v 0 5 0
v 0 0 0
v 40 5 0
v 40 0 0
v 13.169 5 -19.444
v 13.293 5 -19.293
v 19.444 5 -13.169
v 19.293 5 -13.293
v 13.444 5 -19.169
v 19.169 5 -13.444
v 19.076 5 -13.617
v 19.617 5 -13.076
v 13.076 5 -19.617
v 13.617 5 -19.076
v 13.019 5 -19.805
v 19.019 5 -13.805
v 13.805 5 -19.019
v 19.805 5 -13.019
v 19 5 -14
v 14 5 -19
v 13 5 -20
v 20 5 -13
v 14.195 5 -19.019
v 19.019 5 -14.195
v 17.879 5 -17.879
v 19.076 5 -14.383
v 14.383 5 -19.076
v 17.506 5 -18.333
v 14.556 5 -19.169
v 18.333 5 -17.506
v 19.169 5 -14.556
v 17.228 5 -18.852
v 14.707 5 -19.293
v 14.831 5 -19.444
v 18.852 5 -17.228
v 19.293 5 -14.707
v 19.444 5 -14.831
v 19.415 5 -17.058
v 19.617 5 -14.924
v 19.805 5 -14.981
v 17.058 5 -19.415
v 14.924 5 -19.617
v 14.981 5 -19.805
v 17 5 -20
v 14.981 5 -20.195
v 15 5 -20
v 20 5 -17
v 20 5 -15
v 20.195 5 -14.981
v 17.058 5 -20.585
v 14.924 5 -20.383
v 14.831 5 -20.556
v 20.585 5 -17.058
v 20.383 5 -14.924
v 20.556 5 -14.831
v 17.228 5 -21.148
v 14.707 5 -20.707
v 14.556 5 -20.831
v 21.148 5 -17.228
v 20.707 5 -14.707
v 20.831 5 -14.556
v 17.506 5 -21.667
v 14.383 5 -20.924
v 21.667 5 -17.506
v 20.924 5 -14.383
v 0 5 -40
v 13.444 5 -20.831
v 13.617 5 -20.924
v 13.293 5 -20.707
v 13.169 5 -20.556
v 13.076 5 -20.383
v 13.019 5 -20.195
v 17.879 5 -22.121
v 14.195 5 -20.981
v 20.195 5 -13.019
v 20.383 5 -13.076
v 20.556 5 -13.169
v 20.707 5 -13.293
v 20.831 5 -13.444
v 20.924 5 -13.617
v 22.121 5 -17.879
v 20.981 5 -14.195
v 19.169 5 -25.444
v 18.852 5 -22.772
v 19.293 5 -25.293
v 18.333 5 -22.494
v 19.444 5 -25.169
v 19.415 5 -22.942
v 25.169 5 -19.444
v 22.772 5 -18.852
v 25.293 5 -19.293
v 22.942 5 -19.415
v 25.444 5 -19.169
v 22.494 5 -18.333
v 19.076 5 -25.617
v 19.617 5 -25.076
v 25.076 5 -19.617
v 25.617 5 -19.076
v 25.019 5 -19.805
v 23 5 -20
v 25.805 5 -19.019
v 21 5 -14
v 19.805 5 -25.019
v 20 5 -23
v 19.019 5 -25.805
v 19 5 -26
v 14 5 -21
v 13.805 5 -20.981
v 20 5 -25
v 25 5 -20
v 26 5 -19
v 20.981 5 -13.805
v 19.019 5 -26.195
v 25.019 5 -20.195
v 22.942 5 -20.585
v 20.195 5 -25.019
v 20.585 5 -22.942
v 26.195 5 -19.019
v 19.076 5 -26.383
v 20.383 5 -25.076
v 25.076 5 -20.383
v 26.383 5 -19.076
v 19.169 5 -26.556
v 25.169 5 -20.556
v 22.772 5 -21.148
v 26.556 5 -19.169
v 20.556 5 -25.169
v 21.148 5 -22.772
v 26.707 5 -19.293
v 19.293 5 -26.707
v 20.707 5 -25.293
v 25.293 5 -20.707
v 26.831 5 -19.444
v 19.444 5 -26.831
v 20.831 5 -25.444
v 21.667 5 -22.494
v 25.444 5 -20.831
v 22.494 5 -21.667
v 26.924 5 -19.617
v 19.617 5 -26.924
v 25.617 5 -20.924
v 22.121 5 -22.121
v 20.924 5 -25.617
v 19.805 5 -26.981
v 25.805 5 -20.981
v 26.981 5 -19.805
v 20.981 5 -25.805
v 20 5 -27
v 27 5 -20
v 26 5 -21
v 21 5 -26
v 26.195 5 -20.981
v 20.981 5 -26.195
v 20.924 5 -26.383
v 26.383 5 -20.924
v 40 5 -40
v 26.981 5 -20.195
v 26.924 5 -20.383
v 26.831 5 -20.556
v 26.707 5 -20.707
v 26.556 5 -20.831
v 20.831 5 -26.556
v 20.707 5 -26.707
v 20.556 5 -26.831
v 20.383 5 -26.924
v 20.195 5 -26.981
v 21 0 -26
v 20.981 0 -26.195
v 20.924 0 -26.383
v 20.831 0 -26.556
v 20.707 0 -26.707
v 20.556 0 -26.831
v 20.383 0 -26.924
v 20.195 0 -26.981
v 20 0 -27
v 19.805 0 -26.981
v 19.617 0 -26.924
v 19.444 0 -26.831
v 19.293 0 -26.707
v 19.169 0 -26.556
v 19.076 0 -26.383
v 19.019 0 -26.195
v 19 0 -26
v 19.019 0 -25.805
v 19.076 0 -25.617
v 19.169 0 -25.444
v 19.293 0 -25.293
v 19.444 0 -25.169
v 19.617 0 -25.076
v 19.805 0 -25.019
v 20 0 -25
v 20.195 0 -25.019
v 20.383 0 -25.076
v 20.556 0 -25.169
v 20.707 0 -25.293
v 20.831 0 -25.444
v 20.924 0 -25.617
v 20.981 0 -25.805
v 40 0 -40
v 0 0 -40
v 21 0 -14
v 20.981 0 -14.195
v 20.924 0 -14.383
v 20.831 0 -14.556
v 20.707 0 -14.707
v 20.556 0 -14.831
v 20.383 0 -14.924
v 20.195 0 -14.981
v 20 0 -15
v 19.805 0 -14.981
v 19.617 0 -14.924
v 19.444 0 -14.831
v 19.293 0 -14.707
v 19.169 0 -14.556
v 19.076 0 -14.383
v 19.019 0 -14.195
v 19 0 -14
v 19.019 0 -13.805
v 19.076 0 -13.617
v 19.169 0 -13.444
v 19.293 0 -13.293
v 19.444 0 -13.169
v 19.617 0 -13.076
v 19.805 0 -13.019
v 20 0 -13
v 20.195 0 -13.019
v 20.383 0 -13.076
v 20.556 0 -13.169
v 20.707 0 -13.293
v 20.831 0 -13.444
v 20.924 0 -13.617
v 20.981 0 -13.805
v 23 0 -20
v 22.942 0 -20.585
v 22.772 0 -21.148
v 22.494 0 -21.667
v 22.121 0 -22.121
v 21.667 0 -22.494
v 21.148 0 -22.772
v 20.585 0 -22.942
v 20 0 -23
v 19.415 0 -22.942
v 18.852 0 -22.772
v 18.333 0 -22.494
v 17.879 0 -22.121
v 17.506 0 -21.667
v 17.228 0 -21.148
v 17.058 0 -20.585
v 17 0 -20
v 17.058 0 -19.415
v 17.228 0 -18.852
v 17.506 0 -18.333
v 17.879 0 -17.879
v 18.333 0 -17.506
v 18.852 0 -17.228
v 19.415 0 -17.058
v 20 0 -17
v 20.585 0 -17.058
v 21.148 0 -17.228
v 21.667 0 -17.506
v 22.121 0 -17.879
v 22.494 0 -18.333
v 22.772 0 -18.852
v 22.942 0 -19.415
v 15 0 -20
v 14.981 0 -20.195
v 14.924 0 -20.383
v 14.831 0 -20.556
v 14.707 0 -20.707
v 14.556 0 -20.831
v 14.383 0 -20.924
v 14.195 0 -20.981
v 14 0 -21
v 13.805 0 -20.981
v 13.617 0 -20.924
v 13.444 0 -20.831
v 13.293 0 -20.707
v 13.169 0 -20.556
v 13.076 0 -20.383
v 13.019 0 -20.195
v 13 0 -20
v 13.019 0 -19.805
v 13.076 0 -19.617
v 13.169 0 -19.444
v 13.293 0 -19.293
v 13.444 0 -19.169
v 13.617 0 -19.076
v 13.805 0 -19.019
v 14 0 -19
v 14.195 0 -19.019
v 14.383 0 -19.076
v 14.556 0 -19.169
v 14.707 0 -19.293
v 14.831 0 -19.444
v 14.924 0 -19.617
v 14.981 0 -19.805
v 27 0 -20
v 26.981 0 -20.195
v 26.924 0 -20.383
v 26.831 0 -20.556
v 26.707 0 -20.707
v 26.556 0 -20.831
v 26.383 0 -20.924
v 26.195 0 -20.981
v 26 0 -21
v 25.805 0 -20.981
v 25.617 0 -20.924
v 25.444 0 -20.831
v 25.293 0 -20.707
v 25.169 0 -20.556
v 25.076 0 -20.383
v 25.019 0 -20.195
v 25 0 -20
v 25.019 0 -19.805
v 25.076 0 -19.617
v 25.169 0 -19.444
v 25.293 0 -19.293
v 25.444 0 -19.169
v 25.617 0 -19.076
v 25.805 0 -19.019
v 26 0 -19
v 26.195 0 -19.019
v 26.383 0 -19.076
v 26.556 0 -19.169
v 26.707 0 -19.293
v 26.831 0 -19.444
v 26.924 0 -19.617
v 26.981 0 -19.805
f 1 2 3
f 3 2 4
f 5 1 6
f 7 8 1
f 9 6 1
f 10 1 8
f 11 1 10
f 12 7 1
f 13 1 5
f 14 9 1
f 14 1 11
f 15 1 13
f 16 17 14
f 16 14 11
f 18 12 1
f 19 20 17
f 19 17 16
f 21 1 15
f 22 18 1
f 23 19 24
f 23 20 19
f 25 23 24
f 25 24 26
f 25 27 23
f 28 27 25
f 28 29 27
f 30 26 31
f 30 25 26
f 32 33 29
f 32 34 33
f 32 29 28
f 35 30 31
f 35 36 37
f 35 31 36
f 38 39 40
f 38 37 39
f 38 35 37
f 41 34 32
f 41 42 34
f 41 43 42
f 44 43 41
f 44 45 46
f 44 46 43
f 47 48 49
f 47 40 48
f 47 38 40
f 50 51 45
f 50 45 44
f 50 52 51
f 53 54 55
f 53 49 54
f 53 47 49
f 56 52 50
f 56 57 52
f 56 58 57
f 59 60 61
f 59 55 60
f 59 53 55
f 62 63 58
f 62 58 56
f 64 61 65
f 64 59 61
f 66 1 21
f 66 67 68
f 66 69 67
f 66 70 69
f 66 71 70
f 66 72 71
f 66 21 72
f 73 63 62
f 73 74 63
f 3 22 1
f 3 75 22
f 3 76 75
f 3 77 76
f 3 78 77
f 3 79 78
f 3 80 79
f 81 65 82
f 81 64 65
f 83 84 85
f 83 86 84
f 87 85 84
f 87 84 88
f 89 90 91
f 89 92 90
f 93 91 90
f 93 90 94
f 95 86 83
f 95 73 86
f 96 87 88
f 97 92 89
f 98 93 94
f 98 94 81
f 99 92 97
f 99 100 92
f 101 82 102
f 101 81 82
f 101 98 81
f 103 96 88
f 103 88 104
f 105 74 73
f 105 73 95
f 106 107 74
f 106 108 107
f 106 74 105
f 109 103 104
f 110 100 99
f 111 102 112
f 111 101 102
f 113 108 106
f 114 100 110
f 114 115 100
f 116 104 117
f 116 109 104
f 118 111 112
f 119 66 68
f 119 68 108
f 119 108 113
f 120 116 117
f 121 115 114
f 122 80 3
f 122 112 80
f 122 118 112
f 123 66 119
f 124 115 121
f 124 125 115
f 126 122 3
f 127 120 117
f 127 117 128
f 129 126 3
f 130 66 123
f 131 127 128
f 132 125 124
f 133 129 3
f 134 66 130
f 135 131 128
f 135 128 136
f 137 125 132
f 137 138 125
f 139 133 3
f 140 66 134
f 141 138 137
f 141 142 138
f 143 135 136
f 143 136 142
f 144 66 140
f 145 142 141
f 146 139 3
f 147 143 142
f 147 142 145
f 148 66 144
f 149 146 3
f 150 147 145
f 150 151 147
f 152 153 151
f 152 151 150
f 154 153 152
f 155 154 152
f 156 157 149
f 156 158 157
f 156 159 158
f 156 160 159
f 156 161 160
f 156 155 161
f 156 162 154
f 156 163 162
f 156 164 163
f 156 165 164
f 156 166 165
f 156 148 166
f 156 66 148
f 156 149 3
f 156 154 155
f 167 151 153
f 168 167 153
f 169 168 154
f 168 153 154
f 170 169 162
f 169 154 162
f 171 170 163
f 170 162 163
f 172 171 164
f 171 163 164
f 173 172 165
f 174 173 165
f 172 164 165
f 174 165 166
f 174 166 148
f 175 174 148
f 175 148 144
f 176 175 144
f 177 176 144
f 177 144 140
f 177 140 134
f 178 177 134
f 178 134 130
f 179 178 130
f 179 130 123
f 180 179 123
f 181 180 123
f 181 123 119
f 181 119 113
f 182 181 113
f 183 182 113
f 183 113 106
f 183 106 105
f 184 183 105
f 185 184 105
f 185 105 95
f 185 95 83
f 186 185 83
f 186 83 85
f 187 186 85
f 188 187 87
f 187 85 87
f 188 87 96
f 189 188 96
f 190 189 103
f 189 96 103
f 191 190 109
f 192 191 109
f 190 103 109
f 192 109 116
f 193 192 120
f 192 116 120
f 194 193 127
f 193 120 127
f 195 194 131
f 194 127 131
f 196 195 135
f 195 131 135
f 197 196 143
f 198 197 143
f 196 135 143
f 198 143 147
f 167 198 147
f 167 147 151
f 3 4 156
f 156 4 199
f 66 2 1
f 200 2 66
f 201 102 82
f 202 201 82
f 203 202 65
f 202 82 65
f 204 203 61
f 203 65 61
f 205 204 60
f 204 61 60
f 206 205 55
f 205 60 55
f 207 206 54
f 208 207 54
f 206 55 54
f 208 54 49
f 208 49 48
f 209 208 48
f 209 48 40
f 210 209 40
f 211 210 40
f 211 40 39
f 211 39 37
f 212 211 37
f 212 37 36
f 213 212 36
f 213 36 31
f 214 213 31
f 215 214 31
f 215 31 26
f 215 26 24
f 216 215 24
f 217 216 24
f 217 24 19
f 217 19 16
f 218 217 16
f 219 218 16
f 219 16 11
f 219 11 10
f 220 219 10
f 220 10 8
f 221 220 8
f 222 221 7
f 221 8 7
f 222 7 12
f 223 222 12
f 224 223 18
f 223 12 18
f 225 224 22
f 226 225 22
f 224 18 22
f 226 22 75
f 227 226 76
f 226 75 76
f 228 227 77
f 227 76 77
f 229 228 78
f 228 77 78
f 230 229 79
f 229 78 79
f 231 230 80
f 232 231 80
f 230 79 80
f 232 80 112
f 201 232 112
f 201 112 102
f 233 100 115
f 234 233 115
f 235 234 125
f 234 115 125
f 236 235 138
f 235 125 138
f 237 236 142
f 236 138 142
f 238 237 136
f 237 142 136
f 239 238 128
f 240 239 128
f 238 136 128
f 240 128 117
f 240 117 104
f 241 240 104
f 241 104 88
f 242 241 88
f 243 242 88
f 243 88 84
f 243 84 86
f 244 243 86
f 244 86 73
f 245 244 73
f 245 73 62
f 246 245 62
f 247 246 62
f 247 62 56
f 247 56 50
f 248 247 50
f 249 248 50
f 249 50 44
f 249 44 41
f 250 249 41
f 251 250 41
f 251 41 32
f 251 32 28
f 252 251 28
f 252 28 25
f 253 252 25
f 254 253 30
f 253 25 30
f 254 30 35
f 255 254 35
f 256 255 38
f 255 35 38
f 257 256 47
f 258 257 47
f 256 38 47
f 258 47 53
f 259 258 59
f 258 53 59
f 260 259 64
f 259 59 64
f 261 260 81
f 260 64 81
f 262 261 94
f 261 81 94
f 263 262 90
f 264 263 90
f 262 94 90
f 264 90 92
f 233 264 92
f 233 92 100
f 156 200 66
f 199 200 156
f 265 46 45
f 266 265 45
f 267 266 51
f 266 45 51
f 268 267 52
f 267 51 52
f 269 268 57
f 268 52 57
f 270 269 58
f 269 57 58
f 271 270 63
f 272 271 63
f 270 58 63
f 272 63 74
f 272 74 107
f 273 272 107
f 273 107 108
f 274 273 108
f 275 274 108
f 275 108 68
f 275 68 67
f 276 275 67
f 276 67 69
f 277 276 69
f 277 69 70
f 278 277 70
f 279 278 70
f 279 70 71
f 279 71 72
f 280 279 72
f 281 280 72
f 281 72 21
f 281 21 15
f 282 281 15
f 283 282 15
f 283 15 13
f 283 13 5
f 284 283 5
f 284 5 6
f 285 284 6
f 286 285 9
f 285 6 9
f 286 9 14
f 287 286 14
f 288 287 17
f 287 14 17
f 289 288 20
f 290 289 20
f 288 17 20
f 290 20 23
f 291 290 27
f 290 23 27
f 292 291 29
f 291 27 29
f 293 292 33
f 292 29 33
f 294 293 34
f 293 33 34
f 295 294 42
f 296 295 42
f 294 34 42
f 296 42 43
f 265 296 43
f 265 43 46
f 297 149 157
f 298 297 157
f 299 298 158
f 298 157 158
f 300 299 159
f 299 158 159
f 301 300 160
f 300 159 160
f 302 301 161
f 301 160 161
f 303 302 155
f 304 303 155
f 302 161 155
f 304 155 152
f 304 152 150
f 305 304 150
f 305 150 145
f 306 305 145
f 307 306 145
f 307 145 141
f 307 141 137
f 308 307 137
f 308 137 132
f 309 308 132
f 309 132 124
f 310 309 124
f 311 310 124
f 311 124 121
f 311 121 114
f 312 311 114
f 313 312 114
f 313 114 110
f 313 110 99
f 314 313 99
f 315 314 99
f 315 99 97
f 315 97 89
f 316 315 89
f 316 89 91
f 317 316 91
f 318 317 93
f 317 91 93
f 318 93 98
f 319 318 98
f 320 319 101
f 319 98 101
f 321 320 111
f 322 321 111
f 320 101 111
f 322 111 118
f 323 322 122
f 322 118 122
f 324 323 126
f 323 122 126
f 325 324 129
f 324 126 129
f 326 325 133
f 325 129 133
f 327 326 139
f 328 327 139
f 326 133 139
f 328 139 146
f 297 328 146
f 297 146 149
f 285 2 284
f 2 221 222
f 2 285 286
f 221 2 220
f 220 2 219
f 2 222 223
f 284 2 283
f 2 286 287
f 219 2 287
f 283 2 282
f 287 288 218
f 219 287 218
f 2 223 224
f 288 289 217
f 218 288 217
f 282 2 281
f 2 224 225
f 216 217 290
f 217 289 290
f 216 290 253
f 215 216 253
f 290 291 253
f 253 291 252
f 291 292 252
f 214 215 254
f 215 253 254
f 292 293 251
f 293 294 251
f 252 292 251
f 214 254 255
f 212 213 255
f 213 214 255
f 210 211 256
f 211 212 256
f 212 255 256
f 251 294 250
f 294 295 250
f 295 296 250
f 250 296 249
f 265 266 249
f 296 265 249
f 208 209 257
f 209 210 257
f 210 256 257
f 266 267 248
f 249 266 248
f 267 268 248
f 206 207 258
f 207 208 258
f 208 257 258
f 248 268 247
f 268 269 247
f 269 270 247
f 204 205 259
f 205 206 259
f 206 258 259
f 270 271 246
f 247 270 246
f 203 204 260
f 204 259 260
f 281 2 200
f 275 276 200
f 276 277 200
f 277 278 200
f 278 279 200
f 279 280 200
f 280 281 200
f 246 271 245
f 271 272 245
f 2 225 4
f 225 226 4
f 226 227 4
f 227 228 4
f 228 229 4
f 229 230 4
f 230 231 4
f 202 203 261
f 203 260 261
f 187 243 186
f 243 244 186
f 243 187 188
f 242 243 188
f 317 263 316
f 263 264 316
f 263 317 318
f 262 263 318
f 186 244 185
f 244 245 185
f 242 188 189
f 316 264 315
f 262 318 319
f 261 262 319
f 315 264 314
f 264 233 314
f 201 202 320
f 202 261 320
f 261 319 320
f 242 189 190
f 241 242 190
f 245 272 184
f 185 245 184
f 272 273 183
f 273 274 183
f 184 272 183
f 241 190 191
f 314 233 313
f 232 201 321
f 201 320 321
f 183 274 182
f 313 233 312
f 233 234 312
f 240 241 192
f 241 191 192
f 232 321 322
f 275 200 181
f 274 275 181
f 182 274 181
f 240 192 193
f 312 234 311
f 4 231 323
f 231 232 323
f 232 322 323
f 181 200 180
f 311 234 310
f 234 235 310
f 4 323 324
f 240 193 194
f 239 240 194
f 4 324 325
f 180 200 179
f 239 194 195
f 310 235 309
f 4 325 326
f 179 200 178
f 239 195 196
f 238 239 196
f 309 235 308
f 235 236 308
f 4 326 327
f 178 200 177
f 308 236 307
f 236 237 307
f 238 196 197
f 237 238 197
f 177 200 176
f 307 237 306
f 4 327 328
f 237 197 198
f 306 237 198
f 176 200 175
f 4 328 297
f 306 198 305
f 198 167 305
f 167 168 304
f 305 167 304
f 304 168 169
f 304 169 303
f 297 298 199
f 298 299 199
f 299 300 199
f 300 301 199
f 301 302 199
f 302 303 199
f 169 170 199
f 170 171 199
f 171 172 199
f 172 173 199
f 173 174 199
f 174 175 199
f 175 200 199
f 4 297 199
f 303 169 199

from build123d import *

# Parameters (mm, degrees)
SKETCH1_W               = 40
SKETCH1_H               = 40
BOSS_EXTRUDE1_DEPTH     = 5
CUT_EXTRUDE4_DEPTH      = 15
CUT_EXTRUDE4_DEPTH_BACK = 15
SKETCH8_R               = 3
SKETCH8_R_2             = 1


with BuildPart() as part:
    # Sketch1 → Boss-Extrude1 (new body)
    with BuildSketch(Plane(origin=(0, 0, 0), x_dir=(1, 0, 0), z_dir=(0, 1, 0))):
        with Locations((20, 20)):
            Rectangle(SKETCH1_W, SKETCH1_H)
    extrude(amount=BOSS_EXTRUDE1_DEPTH)

    # Sketch8 → Cut-Extrude4 (cut, two sides: drawn at the far end of the back side and taken through both)
    with BuildSketch(Plane(origin=(0, 5, 0), x_dir=(1, 0, 0), z_dir=(0, 1, 0)).offset(-CUT_EXTRUDE4_DEPTH_BACK)):
        with Locations((20, 20)):
            Circle(SKETCH8_R)
        with Locations((20, 14)):
            Circle(SKETCH8_R_2)
        with Locations((26, 20)):
            Circle(SKETCH8_R_2)
        with Locations((14, 20)):
            Circle(SKETCH8_R_2)
        with Locations((20, 26)):
            Circle(SKETCH8_R_2)
    extrude(amount=CUT_EXTRUDE4_DEPTH + CUT_EXTRUDE4_DEPTH_BACK, mode=Mode.SUBTRACT)


solid = part.part
